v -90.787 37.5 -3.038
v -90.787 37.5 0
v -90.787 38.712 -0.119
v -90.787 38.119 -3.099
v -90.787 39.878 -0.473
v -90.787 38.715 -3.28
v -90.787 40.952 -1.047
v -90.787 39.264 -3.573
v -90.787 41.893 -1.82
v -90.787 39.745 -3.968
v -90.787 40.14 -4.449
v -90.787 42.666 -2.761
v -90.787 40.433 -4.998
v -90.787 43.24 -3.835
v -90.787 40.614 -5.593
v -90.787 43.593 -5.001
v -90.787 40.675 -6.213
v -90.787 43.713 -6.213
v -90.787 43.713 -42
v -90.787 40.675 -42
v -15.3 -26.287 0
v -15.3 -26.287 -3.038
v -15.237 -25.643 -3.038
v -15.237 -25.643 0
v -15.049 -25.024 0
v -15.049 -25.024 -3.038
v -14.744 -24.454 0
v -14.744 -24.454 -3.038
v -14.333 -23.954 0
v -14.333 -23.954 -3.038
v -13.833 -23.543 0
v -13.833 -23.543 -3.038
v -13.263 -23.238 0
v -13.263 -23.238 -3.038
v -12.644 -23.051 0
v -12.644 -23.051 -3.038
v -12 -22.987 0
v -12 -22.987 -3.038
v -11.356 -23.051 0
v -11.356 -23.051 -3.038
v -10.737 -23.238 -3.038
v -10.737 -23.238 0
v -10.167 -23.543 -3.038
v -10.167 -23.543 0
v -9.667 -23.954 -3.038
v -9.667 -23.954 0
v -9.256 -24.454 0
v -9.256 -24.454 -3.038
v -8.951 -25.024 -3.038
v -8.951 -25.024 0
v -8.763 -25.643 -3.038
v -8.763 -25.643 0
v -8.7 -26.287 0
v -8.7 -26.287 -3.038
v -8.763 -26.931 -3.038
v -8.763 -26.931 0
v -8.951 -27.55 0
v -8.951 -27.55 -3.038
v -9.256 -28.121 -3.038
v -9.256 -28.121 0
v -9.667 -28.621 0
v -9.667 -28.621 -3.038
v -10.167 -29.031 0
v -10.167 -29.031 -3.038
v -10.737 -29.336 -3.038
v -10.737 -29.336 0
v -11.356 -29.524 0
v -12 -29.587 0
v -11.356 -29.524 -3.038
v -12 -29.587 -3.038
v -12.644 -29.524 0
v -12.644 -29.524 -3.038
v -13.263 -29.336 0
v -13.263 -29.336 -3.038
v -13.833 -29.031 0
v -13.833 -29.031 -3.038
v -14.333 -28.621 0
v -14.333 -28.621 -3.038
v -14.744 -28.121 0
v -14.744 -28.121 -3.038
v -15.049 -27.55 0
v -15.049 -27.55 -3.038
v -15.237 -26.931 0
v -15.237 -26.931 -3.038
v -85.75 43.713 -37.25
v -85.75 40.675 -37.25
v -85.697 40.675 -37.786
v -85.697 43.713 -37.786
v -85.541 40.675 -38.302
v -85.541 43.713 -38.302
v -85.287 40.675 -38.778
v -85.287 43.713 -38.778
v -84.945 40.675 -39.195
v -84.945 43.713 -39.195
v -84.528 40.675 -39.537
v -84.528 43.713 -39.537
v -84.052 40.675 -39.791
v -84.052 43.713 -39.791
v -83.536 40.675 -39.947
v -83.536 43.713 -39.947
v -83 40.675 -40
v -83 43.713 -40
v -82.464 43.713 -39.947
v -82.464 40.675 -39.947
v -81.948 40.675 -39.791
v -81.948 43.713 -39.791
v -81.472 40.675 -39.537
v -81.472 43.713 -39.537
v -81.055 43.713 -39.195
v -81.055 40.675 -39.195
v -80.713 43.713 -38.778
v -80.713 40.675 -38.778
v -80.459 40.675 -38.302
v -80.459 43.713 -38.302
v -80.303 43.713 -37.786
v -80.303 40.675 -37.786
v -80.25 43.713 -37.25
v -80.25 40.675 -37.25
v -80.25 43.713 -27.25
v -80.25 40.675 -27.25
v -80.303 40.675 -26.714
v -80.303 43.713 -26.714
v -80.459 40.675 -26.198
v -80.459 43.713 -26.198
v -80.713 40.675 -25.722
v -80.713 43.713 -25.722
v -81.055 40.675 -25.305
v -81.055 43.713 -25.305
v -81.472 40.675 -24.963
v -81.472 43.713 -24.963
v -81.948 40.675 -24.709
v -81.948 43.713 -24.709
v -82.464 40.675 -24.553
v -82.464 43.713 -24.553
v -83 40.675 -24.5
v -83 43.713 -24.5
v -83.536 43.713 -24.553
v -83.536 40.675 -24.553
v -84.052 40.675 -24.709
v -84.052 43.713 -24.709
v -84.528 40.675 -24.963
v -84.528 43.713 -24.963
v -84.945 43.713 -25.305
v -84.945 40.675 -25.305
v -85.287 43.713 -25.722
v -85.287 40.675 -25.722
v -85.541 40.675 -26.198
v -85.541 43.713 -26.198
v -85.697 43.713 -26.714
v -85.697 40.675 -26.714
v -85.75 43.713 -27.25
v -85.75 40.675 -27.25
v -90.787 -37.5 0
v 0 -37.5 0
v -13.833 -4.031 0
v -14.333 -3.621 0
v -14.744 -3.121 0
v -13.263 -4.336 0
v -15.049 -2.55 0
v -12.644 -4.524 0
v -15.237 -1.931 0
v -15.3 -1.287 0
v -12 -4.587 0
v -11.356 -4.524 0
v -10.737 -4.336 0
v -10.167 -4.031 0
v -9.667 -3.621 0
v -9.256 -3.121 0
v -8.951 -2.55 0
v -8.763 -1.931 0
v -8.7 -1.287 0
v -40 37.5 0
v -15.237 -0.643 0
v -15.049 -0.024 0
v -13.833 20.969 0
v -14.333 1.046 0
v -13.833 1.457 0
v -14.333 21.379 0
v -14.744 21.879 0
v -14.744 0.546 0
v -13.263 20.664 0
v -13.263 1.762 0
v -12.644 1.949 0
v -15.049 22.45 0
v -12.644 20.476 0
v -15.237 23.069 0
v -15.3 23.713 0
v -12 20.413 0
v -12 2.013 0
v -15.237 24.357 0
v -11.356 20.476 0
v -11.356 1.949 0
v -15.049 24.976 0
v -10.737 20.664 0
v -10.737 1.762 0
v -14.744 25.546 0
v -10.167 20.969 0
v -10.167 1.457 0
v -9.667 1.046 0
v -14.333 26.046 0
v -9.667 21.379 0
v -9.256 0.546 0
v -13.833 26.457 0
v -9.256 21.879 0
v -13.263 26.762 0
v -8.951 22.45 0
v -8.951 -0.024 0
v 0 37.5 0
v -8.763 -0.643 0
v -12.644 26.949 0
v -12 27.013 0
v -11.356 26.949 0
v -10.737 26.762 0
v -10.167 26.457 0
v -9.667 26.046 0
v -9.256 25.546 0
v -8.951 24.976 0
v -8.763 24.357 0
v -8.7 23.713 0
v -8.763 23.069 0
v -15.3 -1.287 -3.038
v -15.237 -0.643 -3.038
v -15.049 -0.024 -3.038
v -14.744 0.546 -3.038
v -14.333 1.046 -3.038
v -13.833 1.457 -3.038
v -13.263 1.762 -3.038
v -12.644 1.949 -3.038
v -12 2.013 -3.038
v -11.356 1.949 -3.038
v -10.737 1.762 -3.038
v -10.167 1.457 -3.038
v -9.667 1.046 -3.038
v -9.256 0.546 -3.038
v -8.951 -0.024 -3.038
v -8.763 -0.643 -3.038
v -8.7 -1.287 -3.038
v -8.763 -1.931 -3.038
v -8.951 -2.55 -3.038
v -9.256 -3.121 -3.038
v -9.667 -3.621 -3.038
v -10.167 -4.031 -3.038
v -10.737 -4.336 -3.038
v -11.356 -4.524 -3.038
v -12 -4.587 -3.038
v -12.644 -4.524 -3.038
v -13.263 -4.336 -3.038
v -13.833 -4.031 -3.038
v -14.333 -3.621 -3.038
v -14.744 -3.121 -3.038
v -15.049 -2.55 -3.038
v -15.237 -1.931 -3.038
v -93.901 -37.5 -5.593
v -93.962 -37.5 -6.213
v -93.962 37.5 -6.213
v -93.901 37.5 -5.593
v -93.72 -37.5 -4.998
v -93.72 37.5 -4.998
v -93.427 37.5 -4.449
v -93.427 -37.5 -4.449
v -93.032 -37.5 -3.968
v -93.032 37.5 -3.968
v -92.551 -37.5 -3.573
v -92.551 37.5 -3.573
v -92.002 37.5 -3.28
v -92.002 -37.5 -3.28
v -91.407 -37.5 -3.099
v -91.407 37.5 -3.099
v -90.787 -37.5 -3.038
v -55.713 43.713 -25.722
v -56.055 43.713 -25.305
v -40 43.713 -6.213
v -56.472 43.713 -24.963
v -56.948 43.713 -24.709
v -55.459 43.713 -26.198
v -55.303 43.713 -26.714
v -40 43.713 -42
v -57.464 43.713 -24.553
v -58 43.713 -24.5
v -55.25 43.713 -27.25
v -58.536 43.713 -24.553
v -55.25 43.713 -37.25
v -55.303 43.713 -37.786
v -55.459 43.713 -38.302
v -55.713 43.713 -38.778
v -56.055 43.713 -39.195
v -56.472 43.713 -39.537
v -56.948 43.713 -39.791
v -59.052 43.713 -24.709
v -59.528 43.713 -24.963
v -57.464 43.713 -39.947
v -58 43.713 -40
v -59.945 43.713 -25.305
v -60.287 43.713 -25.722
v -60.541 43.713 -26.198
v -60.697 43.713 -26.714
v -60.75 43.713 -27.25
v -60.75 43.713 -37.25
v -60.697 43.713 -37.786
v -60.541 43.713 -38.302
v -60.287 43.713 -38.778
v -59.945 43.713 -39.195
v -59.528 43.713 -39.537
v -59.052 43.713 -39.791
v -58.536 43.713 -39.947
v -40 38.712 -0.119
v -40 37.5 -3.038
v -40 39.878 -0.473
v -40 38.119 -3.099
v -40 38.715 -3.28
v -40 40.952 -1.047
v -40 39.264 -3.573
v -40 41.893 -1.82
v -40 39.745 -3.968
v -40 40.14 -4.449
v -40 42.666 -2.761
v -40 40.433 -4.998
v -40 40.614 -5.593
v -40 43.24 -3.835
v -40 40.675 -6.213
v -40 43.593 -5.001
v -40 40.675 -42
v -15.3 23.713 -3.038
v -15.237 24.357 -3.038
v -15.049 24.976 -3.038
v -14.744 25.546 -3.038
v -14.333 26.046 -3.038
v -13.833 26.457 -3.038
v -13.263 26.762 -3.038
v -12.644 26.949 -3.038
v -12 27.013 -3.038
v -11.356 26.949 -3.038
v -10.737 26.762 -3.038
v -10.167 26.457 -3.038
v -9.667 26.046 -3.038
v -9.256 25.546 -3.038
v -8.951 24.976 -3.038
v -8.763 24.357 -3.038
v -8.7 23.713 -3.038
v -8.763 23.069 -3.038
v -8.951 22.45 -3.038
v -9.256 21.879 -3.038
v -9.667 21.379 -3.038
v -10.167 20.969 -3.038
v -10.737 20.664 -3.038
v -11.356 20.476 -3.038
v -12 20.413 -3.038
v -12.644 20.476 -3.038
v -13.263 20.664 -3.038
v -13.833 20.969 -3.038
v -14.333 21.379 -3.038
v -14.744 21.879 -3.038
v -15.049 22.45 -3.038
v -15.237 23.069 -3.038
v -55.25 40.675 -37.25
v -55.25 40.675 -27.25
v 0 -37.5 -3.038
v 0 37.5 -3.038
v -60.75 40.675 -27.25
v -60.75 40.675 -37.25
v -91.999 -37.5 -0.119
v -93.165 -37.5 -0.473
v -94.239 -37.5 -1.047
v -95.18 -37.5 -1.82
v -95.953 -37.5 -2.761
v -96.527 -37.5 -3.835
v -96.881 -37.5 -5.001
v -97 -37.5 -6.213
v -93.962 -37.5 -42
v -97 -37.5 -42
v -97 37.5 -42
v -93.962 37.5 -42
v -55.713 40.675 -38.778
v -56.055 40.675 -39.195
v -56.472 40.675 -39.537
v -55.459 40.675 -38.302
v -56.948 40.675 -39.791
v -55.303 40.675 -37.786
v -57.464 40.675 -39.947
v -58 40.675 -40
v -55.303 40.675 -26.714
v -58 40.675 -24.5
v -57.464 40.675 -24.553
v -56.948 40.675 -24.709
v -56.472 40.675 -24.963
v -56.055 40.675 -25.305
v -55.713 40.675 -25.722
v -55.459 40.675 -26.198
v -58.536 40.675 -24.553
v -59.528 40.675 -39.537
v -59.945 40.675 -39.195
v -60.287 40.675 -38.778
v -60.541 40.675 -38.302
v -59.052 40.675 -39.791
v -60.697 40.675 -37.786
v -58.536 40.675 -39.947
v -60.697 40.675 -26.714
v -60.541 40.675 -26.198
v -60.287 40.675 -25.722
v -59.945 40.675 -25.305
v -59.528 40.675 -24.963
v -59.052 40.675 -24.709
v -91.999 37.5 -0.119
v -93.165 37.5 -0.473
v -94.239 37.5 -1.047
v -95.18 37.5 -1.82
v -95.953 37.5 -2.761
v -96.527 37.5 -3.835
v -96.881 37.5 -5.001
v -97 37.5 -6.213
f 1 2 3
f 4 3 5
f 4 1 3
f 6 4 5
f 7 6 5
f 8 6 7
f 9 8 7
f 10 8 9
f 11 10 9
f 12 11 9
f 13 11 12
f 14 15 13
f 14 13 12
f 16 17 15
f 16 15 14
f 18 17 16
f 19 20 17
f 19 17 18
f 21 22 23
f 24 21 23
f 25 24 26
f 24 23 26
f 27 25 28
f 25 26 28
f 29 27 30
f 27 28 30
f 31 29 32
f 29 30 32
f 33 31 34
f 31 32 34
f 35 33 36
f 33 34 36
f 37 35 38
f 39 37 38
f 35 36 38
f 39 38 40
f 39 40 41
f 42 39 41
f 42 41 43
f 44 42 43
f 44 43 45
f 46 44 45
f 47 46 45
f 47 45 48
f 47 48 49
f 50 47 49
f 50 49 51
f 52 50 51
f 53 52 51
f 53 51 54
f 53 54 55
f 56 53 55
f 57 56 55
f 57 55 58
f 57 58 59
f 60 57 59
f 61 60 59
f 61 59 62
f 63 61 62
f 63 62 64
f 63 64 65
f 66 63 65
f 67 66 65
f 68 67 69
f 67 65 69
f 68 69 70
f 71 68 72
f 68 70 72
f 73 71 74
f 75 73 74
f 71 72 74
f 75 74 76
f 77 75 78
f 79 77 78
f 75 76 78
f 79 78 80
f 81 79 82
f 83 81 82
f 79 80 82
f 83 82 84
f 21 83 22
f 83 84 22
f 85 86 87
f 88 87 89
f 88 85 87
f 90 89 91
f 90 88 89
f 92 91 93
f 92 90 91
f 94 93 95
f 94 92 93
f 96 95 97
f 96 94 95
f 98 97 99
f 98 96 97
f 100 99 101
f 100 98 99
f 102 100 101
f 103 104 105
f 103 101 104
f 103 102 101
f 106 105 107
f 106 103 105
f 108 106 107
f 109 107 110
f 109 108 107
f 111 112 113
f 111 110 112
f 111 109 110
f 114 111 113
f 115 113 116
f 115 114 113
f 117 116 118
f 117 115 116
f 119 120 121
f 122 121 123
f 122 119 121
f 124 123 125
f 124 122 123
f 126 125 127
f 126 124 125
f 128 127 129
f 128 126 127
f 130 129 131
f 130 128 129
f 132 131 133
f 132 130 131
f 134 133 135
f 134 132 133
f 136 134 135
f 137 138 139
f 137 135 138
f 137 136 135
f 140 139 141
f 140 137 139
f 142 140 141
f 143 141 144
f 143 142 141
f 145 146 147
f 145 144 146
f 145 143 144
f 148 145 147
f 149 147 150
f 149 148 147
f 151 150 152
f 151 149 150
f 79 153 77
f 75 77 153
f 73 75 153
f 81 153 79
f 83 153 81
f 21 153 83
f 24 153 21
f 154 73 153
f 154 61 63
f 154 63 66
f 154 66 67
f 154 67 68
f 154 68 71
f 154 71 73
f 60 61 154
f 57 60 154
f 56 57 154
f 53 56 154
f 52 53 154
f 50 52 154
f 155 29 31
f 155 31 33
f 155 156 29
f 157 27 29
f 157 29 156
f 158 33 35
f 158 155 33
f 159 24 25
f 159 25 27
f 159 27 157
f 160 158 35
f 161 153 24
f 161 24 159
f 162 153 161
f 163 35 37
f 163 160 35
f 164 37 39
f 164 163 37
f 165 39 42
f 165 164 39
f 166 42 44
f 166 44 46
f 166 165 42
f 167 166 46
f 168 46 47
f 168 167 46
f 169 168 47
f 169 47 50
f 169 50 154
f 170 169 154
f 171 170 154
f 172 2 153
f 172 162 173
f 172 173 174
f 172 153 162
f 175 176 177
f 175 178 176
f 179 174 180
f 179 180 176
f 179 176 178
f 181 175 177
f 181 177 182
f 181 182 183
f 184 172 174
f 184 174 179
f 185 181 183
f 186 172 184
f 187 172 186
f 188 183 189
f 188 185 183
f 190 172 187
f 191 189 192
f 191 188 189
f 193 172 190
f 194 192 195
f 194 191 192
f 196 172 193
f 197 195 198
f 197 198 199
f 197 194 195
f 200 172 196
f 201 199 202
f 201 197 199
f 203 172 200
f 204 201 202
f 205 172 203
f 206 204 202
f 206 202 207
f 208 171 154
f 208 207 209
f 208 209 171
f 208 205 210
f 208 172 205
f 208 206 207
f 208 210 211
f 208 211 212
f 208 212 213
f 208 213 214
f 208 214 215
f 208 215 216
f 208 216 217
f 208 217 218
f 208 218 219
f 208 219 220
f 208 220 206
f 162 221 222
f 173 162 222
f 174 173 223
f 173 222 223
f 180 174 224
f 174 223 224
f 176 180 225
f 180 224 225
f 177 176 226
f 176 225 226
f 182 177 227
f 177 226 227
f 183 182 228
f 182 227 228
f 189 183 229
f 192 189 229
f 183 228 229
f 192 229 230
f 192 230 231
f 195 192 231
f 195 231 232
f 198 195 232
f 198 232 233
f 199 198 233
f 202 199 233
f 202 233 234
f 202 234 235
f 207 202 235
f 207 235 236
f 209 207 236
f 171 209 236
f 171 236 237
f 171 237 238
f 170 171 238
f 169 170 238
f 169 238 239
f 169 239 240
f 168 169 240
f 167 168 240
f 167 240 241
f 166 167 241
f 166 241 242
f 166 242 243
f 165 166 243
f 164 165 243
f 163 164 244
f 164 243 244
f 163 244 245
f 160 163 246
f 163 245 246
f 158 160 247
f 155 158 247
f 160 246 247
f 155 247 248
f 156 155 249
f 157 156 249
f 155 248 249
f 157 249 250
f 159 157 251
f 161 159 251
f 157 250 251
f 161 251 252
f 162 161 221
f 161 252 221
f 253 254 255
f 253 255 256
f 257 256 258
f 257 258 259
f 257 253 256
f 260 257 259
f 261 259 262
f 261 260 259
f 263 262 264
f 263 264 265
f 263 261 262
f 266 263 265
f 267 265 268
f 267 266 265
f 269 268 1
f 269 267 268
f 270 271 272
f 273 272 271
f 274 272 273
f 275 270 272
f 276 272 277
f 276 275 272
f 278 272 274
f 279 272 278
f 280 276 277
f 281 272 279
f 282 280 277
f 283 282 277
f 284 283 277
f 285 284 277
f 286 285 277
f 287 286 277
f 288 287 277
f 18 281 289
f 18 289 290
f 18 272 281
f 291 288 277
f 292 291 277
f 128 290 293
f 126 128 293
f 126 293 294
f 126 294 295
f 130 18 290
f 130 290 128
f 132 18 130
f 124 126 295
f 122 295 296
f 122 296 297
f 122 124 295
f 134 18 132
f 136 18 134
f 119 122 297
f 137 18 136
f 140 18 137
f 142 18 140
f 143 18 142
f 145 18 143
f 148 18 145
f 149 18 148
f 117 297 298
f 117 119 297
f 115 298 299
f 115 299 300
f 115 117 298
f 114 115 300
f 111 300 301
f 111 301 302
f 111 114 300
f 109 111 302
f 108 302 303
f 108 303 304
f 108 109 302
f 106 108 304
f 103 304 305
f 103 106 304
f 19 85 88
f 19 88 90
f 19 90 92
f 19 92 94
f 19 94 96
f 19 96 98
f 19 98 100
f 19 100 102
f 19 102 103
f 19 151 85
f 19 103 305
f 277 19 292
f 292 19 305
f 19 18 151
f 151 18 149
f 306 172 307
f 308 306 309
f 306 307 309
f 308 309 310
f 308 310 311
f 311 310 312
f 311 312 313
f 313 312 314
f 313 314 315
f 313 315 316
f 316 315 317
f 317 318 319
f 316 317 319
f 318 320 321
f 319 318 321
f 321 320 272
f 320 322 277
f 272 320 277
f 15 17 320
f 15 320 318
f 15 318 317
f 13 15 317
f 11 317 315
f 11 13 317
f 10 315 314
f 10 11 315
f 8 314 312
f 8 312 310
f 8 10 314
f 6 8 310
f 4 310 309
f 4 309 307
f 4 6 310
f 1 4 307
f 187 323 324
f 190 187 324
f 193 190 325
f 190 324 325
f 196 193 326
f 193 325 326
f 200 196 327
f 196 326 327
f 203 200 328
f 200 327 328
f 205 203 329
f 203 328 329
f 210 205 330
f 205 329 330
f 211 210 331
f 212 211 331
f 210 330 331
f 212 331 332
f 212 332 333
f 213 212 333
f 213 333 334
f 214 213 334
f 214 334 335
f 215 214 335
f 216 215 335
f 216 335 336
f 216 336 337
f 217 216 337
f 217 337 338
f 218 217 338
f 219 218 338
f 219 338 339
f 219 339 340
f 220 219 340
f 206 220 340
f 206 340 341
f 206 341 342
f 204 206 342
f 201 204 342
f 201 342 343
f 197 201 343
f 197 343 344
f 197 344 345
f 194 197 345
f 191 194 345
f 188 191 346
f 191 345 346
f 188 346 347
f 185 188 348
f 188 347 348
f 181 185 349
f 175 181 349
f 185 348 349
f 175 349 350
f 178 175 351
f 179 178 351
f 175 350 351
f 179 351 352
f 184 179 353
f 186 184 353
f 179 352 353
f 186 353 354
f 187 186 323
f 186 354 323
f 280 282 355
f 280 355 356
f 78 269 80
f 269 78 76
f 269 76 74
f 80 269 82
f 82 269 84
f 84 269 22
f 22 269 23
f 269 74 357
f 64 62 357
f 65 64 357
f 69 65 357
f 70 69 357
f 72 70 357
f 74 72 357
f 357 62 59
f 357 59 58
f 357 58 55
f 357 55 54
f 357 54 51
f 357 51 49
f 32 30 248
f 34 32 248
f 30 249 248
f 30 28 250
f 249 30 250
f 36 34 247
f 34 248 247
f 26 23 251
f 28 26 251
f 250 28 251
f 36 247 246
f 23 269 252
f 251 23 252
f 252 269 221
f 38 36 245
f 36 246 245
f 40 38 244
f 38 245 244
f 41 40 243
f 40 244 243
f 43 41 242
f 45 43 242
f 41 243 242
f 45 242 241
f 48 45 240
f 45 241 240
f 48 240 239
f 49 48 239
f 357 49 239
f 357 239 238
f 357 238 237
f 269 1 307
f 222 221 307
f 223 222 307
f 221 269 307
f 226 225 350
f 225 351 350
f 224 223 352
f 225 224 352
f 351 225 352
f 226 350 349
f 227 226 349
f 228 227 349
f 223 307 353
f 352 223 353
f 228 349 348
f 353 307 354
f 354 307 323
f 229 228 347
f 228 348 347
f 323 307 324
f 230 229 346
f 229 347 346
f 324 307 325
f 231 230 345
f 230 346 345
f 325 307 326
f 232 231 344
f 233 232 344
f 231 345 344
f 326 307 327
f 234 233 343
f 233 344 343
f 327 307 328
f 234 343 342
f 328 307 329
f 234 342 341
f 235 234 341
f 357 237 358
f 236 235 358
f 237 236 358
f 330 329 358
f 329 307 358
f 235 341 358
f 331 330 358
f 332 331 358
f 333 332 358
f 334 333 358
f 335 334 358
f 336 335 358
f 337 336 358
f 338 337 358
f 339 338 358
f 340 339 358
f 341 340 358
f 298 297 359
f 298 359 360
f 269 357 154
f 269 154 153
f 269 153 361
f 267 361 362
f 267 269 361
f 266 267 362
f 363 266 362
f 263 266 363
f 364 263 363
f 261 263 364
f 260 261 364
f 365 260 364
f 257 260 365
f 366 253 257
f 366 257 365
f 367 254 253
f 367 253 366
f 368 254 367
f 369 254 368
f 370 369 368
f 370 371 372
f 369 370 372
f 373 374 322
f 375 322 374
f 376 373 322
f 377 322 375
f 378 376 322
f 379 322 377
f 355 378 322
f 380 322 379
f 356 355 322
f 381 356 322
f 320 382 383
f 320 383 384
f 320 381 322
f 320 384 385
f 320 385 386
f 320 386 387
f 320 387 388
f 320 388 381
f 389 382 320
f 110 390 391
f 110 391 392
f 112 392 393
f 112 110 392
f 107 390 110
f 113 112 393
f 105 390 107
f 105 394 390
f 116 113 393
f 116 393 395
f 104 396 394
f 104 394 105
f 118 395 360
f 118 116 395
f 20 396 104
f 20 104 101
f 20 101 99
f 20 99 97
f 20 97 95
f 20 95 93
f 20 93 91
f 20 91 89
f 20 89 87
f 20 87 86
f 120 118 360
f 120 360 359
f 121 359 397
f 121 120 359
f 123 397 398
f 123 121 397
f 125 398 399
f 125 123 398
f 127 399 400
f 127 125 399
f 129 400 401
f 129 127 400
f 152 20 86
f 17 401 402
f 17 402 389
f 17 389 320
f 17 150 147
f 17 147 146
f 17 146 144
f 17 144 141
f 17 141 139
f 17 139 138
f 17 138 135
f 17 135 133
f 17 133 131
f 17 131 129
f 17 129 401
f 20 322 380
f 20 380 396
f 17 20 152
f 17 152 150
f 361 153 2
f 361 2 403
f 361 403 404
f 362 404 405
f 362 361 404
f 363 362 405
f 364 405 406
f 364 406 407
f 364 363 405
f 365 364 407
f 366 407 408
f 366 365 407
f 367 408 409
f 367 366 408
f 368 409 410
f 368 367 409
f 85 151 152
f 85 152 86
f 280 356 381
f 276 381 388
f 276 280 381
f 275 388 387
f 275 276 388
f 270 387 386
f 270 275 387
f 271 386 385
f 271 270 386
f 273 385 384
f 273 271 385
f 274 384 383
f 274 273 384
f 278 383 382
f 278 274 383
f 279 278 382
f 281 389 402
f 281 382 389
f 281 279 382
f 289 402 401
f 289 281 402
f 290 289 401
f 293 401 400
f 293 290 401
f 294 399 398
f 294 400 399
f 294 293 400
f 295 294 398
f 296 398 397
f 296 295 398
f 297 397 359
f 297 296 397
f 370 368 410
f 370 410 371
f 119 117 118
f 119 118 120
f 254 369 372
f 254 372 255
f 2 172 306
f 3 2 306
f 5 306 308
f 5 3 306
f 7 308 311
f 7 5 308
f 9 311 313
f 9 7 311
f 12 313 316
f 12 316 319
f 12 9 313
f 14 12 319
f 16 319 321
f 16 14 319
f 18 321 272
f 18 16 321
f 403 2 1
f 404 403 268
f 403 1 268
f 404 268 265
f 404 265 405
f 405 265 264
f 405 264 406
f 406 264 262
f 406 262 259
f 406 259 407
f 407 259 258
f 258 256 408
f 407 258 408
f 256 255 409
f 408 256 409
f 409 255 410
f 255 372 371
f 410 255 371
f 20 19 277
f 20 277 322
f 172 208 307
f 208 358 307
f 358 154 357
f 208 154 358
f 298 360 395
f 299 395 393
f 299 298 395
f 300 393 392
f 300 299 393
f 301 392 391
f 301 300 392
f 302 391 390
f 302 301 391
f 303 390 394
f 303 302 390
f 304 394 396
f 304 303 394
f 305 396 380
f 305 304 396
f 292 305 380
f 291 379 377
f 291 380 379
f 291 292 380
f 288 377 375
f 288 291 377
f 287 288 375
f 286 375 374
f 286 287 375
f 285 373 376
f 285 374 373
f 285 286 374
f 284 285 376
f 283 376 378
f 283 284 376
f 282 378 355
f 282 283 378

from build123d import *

# Parameters (mm, degrees)
SKETCH1_W                    = 97
SKETCH1_H                    = 75
BASE_FLANGE1_DEPTH           = 3.03784
EDGE_FLANGE1_STRIP_W         = 18.50136
EDGE_FLANGE1_STRIP_H         = 3.03784
EDGE_FLANGE1_STRIP_CUT_DEPTH = 75
EDGE_FLANGE1_DEPTH           = 75
EDGE_FLANGE2_DEPTH           = 50.78716
CUT_EXTRUDE3_DEPTH           = 134.298632329
M6_CLEARANCE_HOLE1_D         = 6.6


# Sheet-metal steps are written as plain solids
with BuildPart() as part:
    # Sketch1 → Base-Flange1 (new body)
    with BuildSketch(Plane.XY):
        with Locations((-48.5, 0)):
            Rectangle(SKETCH1_W, SKETCH1_H)
    extrude(amount=-BASE_FLANGE1_DEPTH)

    # Edge-Flange1 strip (across the edge) → Edge-Flange1 strip cut (cut)
    with BuildSketch(Plane(origin=(-97, -37.5, -3.03784), x_dir=(1, 0, 0), z_dir=(0, 1, 0))):
        with Locations((-3.03784, -1.51892)):
            Rectangle(EDGE_FLANGE1_STRIP_W, EDGE_FLANGE1_STRIP_H)
    extrude(amount=EDGE_FLANGE1_STRIP_CUT_DEPTH, mode=Mode.SUBTRACT)

    # Edge-Flange1 section (across the edge) → Edge-Flange1 (add)
    with BuildSketch(Plane(origin=(-97, -37.5, -3.03784), x_dir=(1, 0, 0), z_dir=(0, 1, 0))):
        with BuildLine():
            Line((0, 3.175), (0, 38.96216))
            Line((0, 38.96216), (3.03784, 38.96216))
            Line((3.03784, 38.96216), (3.03784, 3.175))
            ThreePointArc((3.03784, 3.175), (3.96777597, 0.92993597), (6.21284, 0))
            Line((6.21284, 0), (6.21284, -3.03784))
            ThreePointArc((6.21284, -3.03784), (1.819698706, -1.218141294), (0, 3.175))
        make_face()
    extrude(amount=EDGE_FLANGE1_DEPTH)

    # Edge-Flange2 section (across the edge) → Edge-Flange2 (add)
    with BuildSketch(Plane(origin=(-90.78716, 40.675, -3.03784), x_dir=(0, -1, 0), z_dir=(1, 0, 0))):
        with BuildLine():
            Line((-3.03784, 3.175), (-3.03784, 38.96216))
            Line((-3.03784, 38.96216), (0, 38.96216))
            Line((0, 38.96216), (0, 3.175))
            ThreePointArc((0, 3.175), (0.92993597, 0.92993597), (3.175, 0))
            Line((3.175, 0), (3.175, -3.03784))
            ThreePointArc((3.175, -3.03784), (-1.218141294, -1.218141294), (-3.03784, 3.175))
        make_face()
    extrude(amount=EDGE_FLANGE2_DEPTH)

    # Sketch13 → Cut-Extrude3 (cut, through all)
    with BuildSketch(Plane(origin=(0, 43.71284, 0), x_dir=(1, 0, 0), z_dir=(0, 1, 0))):
        with BuildLine():
            Line((-80.25, 37.25), (-80.25, 27.25))
            ThreePointArc((-80.25, 27.25), (-83, 24.5), (-85.75, 27.25))
            Line((-85.75, 27.25), (-85.75, 37.25))
            ThreePointArc((-85.75, 37.25), (-83, 40), (-80.25, 37.25))
        make_face()
        with BuildLine():
            Line((-55.25, 37.25), (-55.25, 27.25))
            ThreePointArc((-55.25, 27.25), (-58, 24.5), (-60.75, 27.25))
            Line((-60.75, 27.25), (-60.75, 37.25))
            ThreePointArc((-60.75, 37.25), (-58, 40), (-55.25, 37.25))
        make_face()
    extrude(amount=-CUT_EXTRUDE3_DEPTH, mode=Mode.SUBTRACT)

    # M6 Clearance Hole1 (through all)
    with Locations(Plane.XY):
        with Locations((-12, 23.71284), (-12, -26.28716), (-12, -1.28716)):
            Hole(M6_CLEARANCE_HOLE1_D / 2)


solid = part.part
